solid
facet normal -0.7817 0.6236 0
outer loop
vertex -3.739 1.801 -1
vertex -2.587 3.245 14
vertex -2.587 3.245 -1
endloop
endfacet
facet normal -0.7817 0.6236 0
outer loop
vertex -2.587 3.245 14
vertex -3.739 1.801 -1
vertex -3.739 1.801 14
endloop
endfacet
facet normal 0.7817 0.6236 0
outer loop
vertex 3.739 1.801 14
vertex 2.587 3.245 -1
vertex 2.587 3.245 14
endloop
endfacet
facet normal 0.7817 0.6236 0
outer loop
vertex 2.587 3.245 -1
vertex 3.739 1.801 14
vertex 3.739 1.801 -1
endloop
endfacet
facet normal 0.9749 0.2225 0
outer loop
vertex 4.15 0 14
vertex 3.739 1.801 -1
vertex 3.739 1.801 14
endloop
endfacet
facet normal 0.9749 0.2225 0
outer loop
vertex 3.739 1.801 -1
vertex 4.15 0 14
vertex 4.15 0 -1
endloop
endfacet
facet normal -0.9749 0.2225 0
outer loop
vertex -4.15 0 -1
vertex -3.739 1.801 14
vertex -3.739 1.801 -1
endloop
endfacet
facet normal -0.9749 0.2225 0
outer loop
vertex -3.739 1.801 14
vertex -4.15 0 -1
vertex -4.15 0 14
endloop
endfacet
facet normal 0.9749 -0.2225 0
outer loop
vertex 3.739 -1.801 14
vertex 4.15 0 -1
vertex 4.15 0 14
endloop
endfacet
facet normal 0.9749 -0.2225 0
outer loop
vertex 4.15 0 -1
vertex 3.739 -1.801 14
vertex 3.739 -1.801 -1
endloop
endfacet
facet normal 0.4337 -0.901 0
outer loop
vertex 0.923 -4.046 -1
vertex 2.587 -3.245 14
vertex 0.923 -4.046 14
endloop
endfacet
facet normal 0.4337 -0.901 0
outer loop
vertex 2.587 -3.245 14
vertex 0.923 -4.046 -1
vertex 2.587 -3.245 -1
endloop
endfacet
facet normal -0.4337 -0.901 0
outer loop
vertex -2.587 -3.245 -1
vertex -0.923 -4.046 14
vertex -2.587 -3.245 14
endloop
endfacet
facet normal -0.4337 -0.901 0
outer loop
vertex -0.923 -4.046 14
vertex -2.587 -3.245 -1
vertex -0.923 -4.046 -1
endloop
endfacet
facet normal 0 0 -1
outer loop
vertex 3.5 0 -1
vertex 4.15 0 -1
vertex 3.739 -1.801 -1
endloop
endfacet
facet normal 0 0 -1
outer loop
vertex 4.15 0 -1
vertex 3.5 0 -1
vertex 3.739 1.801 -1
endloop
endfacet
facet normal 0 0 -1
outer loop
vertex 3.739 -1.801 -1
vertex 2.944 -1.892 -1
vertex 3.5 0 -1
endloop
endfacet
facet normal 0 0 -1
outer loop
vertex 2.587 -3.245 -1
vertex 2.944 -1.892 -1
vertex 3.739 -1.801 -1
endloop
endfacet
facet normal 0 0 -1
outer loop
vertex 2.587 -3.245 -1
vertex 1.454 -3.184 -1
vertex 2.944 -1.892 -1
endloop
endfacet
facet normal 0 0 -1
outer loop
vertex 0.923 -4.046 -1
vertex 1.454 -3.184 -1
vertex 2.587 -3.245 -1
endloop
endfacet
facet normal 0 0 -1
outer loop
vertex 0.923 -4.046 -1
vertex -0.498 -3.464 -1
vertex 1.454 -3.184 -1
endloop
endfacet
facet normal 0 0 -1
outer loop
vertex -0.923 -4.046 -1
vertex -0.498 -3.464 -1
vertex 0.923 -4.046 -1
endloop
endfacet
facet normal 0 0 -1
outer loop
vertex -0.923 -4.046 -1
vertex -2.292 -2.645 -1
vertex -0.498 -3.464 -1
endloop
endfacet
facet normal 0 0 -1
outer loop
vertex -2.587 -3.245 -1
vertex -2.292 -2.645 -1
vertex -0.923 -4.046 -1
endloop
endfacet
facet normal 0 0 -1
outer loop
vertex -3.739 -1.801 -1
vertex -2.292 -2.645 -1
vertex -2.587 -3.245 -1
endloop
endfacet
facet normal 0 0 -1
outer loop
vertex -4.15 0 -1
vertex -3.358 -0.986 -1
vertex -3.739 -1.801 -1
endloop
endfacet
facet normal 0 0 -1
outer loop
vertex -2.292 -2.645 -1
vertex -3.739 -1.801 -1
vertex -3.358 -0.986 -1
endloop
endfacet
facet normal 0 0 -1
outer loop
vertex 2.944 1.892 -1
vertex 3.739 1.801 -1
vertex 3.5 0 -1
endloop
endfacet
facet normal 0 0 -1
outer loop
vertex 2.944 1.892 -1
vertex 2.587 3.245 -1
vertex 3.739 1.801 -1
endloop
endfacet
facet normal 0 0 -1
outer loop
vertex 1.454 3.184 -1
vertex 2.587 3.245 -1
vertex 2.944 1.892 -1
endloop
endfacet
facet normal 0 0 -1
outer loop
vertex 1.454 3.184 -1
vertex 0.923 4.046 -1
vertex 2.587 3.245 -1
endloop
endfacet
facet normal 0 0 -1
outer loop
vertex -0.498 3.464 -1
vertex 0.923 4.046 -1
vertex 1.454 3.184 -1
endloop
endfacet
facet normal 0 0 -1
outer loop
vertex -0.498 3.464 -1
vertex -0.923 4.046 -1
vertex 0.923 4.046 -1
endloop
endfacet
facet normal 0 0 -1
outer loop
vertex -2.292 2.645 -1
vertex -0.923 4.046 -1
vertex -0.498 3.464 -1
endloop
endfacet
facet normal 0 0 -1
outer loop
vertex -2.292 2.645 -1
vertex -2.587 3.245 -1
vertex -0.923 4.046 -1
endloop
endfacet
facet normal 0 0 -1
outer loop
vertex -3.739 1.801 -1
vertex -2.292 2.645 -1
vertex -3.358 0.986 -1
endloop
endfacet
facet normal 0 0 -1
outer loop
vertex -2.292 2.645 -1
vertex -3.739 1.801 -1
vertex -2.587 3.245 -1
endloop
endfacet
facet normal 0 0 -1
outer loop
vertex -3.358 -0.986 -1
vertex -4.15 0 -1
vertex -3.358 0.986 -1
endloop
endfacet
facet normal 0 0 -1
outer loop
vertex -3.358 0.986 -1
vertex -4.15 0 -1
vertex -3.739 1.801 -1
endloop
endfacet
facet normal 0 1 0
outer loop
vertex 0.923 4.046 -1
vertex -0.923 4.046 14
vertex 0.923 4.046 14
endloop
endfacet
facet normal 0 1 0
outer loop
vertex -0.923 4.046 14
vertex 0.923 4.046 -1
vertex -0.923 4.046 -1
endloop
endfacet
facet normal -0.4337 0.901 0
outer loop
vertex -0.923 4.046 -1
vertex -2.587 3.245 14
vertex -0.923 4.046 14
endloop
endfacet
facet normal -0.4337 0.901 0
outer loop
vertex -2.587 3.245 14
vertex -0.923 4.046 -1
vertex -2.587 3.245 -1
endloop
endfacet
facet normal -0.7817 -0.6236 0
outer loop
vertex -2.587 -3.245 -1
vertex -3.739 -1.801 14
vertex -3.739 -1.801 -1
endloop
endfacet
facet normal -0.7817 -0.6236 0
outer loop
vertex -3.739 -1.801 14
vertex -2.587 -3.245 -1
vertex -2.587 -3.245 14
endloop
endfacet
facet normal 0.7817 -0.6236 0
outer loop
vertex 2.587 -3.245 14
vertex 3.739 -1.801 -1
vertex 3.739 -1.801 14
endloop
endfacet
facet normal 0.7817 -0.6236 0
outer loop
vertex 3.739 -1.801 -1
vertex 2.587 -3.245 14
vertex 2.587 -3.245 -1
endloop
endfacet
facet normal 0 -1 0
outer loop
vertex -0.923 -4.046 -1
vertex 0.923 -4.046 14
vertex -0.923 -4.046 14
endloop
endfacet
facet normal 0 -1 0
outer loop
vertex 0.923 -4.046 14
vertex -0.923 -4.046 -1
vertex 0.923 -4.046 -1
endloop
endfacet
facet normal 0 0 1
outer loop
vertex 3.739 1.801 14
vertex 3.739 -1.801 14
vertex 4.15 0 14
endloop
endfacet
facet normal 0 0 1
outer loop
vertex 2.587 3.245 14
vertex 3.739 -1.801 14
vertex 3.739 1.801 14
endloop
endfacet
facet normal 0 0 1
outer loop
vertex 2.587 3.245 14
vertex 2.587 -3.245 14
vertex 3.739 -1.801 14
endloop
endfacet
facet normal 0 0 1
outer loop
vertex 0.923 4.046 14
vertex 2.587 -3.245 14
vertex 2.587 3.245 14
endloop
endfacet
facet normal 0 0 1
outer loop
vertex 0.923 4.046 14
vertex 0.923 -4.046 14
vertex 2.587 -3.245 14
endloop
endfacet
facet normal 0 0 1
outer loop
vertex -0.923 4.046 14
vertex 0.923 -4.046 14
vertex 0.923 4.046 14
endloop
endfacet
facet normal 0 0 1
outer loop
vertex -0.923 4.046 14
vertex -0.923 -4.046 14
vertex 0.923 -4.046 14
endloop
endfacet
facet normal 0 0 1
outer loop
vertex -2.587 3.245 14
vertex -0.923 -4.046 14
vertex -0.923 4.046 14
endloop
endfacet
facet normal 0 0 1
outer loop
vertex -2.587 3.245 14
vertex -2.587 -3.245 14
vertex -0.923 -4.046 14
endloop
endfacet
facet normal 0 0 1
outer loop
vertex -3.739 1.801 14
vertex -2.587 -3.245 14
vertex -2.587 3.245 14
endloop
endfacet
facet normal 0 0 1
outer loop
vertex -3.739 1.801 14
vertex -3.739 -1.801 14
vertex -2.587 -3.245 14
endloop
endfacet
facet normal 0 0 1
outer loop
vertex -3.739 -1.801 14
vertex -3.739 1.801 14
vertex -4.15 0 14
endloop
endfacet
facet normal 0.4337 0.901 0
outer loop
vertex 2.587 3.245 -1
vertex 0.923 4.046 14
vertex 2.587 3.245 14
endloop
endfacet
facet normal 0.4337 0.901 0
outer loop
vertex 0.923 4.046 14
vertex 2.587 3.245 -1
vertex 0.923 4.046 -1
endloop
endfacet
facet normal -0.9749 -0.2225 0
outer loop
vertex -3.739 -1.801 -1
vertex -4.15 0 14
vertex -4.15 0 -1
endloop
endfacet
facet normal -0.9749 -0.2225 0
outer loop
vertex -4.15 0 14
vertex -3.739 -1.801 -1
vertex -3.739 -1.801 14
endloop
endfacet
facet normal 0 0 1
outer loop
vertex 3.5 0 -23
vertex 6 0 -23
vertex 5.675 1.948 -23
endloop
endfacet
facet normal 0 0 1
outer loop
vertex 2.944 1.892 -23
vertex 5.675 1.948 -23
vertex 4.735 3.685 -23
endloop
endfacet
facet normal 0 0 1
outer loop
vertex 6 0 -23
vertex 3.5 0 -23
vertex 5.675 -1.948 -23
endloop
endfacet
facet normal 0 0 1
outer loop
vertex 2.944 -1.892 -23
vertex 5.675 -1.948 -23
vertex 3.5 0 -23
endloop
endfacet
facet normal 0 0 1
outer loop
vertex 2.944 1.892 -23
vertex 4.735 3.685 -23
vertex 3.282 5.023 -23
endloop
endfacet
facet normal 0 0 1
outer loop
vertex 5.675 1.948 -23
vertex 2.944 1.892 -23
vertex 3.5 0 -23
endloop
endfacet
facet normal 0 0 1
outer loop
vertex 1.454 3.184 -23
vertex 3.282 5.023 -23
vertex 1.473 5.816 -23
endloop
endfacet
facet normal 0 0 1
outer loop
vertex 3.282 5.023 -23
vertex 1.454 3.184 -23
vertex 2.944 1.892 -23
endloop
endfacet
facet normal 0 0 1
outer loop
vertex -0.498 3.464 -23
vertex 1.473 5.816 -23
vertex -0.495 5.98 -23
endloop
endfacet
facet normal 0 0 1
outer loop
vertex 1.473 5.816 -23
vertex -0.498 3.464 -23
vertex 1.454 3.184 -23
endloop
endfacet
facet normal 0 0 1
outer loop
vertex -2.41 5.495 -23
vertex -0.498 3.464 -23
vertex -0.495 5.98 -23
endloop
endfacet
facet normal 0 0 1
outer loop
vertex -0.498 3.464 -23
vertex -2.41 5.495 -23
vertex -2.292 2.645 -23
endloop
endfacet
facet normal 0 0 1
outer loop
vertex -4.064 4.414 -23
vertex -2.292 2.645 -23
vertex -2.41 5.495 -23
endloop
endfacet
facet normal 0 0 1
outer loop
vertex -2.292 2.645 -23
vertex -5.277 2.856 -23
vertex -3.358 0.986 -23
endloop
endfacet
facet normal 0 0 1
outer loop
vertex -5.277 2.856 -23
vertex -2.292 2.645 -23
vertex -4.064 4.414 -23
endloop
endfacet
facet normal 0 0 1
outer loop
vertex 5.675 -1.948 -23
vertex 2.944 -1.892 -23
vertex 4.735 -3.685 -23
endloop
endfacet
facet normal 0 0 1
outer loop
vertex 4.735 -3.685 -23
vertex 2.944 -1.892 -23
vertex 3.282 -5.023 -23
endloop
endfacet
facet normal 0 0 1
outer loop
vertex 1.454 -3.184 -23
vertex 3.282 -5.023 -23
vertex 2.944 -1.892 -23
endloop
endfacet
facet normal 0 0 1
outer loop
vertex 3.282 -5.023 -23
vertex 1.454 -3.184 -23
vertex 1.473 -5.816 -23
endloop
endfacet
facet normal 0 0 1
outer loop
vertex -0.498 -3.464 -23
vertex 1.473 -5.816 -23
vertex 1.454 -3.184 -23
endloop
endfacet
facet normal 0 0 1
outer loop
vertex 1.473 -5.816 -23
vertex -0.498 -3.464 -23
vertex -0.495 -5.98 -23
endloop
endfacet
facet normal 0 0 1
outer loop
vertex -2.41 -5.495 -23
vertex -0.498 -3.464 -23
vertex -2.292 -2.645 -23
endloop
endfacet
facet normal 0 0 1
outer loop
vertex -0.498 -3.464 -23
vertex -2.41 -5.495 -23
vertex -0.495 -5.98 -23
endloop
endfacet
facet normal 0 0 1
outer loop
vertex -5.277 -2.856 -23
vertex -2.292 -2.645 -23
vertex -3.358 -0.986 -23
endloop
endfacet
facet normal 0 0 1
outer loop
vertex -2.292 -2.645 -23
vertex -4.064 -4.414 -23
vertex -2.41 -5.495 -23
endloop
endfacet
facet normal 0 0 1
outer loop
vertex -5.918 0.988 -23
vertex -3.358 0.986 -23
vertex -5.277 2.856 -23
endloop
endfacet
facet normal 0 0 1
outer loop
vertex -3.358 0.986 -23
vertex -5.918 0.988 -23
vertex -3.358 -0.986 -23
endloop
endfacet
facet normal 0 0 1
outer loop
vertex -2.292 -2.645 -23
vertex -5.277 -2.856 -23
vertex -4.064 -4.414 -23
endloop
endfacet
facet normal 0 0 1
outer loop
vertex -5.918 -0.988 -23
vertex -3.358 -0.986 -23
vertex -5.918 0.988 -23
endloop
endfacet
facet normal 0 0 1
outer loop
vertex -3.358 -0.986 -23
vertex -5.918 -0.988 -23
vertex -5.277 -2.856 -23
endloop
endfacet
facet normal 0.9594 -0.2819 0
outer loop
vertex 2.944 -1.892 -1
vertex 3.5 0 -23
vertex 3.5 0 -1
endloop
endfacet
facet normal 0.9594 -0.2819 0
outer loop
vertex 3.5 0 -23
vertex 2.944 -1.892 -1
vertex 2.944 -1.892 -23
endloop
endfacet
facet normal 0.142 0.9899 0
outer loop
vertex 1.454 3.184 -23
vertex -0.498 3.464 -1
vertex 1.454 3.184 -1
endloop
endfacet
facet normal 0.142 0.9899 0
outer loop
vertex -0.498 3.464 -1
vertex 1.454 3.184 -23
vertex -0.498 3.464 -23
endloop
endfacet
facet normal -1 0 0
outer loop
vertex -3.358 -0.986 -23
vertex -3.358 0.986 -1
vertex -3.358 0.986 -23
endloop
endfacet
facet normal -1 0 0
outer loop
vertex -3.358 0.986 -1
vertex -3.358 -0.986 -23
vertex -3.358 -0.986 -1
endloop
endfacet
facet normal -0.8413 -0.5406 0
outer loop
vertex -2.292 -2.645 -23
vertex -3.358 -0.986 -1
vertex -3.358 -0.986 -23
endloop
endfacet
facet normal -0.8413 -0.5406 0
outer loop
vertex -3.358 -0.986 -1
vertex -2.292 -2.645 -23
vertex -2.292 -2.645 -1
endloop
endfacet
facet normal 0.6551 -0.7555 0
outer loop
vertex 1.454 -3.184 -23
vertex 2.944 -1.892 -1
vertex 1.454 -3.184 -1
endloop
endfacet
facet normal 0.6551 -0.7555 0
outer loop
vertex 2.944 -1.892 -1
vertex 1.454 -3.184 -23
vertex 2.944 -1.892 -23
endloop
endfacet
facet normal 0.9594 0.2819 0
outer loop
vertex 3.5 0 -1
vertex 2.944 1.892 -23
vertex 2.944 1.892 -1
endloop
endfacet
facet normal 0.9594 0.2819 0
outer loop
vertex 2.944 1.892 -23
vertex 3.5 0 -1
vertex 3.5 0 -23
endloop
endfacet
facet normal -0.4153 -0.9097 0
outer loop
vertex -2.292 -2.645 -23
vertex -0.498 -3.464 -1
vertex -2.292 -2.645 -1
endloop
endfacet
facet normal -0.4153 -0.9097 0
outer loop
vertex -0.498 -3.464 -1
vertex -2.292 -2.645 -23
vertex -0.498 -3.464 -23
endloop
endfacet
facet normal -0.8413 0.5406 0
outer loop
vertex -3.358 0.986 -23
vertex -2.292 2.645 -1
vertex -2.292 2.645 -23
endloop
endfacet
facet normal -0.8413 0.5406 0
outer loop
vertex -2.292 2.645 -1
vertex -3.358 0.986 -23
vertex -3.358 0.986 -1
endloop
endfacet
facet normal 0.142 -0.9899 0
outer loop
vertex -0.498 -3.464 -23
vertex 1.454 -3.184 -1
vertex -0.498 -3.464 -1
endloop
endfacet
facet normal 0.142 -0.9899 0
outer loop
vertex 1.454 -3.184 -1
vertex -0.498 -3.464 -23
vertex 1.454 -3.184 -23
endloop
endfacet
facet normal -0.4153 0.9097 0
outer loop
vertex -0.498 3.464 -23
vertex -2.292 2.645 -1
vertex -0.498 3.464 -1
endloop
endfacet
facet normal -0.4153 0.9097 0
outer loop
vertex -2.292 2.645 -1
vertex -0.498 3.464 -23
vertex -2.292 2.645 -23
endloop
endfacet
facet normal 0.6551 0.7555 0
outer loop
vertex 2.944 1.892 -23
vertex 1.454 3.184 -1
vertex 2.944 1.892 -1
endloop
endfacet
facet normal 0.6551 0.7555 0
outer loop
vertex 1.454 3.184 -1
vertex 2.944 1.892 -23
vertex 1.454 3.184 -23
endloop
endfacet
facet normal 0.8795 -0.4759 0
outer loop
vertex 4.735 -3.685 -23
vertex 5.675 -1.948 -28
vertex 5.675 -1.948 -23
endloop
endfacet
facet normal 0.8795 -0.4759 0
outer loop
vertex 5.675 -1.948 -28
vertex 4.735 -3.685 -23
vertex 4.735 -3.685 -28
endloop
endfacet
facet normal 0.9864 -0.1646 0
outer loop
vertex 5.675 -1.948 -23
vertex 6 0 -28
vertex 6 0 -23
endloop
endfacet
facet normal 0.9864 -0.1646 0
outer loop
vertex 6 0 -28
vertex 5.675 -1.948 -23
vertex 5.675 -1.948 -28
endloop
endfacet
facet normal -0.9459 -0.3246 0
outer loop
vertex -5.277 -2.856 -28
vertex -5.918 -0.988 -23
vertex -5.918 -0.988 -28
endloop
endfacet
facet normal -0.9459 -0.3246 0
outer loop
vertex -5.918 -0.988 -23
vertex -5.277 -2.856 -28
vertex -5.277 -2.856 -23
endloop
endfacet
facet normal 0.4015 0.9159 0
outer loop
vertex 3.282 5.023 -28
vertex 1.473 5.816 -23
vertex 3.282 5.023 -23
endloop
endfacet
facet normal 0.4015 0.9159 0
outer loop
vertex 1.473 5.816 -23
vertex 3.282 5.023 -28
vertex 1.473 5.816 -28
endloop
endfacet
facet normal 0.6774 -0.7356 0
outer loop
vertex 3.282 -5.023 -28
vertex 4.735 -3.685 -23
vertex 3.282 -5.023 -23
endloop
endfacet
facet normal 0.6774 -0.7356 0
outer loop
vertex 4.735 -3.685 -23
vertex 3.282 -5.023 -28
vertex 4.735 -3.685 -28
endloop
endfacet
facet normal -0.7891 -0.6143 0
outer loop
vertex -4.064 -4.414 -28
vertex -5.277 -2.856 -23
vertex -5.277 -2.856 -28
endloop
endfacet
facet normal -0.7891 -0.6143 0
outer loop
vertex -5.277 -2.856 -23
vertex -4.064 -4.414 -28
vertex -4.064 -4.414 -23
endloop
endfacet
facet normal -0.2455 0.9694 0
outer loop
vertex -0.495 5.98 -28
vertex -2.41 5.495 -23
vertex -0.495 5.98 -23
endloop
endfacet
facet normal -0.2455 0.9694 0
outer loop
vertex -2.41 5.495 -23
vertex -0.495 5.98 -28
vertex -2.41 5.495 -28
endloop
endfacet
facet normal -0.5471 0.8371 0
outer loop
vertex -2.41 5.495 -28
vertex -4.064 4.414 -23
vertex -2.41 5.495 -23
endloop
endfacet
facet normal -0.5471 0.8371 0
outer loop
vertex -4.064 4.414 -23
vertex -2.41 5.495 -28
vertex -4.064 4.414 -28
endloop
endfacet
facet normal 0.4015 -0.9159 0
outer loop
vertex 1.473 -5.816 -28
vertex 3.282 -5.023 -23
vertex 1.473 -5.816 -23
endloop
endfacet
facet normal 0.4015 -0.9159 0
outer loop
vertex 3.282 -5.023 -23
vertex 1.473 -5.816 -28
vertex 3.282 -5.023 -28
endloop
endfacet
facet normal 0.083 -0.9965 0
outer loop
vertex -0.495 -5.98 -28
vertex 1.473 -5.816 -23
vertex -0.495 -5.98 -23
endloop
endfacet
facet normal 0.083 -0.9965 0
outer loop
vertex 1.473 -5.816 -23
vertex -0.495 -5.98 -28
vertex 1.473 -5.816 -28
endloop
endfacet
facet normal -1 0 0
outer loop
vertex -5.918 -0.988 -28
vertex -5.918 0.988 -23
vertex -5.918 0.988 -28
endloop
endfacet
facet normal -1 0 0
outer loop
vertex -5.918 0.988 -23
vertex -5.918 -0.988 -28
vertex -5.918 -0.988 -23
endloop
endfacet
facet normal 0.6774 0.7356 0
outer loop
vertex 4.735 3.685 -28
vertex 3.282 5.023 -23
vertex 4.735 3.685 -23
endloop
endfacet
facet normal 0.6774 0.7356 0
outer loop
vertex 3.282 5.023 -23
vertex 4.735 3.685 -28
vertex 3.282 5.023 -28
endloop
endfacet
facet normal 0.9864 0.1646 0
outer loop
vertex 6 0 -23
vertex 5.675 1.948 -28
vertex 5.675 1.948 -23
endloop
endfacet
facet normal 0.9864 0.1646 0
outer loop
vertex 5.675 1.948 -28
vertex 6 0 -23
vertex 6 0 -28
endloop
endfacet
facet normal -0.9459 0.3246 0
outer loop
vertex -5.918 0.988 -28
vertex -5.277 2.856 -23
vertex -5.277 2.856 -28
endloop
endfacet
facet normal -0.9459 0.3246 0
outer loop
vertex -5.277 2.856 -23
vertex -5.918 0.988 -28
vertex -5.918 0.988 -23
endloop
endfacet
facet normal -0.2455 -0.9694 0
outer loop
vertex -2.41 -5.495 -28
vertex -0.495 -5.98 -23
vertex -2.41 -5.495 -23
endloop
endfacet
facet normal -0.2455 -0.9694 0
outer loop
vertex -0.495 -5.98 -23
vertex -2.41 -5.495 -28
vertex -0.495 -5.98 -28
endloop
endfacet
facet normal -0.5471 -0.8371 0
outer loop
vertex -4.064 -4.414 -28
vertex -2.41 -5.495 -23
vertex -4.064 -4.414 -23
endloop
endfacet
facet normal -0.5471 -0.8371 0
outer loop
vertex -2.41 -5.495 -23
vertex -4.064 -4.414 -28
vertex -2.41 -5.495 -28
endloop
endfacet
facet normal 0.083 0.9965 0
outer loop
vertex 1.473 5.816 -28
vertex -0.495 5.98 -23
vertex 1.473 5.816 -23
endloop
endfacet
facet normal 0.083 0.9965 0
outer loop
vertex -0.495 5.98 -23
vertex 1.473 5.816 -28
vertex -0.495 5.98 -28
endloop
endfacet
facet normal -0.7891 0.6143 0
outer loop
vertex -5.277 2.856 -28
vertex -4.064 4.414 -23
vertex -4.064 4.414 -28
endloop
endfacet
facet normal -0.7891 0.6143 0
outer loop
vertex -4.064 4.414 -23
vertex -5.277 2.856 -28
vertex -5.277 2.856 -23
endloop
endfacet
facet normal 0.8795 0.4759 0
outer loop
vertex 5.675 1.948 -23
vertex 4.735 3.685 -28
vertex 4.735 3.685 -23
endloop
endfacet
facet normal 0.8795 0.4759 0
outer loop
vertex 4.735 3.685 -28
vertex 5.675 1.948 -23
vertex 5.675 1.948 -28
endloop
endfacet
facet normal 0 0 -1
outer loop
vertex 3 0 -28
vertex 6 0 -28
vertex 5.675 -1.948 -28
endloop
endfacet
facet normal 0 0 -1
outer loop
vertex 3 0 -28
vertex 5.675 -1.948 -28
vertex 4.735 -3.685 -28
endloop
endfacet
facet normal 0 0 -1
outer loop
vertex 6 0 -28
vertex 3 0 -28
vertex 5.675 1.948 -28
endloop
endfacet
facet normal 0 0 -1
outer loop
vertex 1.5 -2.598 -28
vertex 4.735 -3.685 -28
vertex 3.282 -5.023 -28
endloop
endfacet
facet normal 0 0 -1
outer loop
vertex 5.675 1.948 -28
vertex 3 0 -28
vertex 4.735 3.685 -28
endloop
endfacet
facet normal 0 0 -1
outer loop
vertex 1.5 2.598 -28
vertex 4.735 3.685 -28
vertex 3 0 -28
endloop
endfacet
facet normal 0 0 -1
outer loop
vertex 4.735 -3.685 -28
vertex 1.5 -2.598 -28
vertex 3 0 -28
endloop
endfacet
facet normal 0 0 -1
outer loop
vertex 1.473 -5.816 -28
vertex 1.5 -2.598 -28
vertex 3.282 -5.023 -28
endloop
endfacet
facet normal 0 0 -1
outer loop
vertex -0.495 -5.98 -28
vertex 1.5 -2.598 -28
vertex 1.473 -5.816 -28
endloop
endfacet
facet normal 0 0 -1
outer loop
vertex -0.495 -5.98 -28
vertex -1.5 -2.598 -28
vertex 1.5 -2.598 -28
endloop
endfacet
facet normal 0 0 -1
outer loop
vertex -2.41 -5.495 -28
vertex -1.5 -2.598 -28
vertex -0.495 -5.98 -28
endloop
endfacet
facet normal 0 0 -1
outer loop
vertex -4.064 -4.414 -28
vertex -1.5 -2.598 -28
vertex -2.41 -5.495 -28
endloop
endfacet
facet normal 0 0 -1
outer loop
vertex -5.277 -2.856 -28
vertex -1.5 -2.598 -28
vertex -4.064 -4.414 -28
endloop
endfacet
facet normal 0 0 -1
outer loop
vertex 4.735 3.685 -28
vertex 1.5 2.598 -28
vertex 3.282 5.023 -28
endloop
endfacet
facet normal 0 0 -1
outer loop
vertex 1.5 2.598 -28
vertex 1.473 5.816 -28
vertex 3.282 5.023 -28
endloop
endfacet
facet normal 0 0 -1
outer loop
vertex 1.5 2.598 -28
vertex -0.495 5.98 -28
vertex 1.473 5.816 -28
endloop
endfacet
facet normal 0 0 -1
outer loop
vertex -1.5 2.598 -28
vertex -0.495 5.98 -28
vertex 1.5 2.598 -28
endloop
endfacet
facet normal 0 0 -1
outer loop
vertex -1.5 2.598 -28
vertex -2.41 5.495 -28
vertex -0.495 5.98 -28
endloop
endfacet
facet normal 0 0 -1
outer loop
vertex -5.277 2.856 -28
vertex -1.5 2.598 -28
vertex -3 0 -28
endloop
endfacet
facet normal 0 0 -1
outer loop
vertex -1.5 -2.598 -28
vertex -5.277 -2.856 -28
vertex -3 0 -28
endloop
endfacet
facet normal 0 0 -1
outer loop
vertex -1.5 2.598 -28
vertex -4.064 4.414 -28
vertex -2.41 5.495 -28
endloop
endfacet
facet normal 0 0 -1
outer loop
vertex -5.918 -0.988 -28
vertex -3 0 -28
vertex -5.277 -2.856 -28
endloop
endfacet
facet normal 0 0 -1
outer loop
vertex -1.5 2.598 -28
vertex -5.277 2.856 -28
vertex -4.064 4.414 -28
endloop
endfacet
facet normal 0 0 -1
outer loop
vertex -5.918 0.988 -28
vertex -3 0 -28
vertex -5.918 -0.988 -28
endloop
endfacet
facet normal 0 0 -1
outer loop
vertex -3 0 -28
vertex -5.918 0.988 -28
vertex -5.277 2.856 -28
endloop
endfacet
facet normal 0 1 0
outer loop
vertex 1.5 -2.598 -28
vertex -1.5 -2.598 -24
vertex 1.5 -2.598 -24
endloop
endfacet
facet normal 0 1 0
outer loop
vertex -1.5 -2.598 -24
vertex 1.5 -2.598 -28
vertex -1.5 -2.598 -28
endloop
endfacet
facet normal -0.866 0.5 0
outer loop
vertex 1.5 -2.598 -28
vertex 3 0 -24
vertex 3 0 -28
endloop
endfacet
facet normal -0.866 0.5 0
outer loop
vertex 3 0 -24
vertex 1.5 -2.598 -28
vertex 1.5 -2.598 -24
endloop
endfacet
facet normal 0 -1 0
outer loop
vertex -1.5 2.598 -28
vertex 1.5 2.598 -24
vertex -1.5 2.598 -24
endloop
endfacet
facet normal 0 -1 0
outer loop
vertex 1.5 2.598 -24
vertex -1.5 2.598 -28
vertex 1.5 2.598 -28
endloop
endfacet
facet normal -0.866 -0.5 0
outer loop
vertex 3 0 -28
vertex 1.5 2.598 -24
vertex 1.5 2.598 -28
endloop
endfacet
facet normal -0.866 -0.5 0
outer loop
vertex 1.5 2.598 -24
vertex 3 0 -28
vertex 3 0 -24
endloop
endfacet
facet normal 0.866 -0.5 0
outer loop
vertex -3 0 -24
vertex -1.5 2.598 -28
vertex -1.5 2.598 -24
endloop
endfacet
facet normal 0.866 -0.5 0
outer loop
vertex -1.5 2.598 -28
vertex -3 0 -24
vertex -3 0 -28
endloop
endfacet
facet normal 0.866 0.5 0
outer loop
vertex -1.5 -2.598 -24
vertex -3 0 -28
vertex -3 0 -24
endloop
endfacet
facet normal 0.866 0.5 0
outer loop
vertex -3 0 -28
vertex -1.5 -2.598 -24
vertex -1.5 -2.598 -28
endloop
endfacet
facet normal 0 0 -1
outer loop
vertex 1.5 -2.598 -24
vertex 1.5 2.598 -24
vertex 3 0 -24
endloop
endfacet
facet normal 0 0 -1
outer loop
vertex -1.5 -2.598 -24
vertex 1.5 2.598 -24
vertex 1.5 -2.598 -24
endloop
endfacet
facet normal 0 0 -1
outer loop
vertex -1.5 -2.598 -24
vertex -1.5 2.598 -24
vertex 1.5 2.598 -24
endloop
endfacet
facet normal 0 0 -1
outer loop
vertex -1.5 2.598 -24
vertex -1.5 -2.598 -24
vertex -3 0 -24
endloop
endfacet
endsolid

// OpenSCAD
dim_thread = 15;
dim_shaft = 38;
difference(){
	union(){
		translate([0,0,-1])cylinder(r=4.15,h=dim_thread);
		rotate([180,0,0])cylinder(r=3.5,h=dim_shaft - dim_thread);
		translate([0,0,-(dim_shaft - dim_thread) ])rotate([180,0,0])cylinder(r=6,h=5);
	}
	#translate([0,0,-(dim_shaft - dim_thread) - 5.1])
	{
		cylinder(r=3,h=4.1,$fn=6);
		//cube([5,5,5],center=true);
	}
}
